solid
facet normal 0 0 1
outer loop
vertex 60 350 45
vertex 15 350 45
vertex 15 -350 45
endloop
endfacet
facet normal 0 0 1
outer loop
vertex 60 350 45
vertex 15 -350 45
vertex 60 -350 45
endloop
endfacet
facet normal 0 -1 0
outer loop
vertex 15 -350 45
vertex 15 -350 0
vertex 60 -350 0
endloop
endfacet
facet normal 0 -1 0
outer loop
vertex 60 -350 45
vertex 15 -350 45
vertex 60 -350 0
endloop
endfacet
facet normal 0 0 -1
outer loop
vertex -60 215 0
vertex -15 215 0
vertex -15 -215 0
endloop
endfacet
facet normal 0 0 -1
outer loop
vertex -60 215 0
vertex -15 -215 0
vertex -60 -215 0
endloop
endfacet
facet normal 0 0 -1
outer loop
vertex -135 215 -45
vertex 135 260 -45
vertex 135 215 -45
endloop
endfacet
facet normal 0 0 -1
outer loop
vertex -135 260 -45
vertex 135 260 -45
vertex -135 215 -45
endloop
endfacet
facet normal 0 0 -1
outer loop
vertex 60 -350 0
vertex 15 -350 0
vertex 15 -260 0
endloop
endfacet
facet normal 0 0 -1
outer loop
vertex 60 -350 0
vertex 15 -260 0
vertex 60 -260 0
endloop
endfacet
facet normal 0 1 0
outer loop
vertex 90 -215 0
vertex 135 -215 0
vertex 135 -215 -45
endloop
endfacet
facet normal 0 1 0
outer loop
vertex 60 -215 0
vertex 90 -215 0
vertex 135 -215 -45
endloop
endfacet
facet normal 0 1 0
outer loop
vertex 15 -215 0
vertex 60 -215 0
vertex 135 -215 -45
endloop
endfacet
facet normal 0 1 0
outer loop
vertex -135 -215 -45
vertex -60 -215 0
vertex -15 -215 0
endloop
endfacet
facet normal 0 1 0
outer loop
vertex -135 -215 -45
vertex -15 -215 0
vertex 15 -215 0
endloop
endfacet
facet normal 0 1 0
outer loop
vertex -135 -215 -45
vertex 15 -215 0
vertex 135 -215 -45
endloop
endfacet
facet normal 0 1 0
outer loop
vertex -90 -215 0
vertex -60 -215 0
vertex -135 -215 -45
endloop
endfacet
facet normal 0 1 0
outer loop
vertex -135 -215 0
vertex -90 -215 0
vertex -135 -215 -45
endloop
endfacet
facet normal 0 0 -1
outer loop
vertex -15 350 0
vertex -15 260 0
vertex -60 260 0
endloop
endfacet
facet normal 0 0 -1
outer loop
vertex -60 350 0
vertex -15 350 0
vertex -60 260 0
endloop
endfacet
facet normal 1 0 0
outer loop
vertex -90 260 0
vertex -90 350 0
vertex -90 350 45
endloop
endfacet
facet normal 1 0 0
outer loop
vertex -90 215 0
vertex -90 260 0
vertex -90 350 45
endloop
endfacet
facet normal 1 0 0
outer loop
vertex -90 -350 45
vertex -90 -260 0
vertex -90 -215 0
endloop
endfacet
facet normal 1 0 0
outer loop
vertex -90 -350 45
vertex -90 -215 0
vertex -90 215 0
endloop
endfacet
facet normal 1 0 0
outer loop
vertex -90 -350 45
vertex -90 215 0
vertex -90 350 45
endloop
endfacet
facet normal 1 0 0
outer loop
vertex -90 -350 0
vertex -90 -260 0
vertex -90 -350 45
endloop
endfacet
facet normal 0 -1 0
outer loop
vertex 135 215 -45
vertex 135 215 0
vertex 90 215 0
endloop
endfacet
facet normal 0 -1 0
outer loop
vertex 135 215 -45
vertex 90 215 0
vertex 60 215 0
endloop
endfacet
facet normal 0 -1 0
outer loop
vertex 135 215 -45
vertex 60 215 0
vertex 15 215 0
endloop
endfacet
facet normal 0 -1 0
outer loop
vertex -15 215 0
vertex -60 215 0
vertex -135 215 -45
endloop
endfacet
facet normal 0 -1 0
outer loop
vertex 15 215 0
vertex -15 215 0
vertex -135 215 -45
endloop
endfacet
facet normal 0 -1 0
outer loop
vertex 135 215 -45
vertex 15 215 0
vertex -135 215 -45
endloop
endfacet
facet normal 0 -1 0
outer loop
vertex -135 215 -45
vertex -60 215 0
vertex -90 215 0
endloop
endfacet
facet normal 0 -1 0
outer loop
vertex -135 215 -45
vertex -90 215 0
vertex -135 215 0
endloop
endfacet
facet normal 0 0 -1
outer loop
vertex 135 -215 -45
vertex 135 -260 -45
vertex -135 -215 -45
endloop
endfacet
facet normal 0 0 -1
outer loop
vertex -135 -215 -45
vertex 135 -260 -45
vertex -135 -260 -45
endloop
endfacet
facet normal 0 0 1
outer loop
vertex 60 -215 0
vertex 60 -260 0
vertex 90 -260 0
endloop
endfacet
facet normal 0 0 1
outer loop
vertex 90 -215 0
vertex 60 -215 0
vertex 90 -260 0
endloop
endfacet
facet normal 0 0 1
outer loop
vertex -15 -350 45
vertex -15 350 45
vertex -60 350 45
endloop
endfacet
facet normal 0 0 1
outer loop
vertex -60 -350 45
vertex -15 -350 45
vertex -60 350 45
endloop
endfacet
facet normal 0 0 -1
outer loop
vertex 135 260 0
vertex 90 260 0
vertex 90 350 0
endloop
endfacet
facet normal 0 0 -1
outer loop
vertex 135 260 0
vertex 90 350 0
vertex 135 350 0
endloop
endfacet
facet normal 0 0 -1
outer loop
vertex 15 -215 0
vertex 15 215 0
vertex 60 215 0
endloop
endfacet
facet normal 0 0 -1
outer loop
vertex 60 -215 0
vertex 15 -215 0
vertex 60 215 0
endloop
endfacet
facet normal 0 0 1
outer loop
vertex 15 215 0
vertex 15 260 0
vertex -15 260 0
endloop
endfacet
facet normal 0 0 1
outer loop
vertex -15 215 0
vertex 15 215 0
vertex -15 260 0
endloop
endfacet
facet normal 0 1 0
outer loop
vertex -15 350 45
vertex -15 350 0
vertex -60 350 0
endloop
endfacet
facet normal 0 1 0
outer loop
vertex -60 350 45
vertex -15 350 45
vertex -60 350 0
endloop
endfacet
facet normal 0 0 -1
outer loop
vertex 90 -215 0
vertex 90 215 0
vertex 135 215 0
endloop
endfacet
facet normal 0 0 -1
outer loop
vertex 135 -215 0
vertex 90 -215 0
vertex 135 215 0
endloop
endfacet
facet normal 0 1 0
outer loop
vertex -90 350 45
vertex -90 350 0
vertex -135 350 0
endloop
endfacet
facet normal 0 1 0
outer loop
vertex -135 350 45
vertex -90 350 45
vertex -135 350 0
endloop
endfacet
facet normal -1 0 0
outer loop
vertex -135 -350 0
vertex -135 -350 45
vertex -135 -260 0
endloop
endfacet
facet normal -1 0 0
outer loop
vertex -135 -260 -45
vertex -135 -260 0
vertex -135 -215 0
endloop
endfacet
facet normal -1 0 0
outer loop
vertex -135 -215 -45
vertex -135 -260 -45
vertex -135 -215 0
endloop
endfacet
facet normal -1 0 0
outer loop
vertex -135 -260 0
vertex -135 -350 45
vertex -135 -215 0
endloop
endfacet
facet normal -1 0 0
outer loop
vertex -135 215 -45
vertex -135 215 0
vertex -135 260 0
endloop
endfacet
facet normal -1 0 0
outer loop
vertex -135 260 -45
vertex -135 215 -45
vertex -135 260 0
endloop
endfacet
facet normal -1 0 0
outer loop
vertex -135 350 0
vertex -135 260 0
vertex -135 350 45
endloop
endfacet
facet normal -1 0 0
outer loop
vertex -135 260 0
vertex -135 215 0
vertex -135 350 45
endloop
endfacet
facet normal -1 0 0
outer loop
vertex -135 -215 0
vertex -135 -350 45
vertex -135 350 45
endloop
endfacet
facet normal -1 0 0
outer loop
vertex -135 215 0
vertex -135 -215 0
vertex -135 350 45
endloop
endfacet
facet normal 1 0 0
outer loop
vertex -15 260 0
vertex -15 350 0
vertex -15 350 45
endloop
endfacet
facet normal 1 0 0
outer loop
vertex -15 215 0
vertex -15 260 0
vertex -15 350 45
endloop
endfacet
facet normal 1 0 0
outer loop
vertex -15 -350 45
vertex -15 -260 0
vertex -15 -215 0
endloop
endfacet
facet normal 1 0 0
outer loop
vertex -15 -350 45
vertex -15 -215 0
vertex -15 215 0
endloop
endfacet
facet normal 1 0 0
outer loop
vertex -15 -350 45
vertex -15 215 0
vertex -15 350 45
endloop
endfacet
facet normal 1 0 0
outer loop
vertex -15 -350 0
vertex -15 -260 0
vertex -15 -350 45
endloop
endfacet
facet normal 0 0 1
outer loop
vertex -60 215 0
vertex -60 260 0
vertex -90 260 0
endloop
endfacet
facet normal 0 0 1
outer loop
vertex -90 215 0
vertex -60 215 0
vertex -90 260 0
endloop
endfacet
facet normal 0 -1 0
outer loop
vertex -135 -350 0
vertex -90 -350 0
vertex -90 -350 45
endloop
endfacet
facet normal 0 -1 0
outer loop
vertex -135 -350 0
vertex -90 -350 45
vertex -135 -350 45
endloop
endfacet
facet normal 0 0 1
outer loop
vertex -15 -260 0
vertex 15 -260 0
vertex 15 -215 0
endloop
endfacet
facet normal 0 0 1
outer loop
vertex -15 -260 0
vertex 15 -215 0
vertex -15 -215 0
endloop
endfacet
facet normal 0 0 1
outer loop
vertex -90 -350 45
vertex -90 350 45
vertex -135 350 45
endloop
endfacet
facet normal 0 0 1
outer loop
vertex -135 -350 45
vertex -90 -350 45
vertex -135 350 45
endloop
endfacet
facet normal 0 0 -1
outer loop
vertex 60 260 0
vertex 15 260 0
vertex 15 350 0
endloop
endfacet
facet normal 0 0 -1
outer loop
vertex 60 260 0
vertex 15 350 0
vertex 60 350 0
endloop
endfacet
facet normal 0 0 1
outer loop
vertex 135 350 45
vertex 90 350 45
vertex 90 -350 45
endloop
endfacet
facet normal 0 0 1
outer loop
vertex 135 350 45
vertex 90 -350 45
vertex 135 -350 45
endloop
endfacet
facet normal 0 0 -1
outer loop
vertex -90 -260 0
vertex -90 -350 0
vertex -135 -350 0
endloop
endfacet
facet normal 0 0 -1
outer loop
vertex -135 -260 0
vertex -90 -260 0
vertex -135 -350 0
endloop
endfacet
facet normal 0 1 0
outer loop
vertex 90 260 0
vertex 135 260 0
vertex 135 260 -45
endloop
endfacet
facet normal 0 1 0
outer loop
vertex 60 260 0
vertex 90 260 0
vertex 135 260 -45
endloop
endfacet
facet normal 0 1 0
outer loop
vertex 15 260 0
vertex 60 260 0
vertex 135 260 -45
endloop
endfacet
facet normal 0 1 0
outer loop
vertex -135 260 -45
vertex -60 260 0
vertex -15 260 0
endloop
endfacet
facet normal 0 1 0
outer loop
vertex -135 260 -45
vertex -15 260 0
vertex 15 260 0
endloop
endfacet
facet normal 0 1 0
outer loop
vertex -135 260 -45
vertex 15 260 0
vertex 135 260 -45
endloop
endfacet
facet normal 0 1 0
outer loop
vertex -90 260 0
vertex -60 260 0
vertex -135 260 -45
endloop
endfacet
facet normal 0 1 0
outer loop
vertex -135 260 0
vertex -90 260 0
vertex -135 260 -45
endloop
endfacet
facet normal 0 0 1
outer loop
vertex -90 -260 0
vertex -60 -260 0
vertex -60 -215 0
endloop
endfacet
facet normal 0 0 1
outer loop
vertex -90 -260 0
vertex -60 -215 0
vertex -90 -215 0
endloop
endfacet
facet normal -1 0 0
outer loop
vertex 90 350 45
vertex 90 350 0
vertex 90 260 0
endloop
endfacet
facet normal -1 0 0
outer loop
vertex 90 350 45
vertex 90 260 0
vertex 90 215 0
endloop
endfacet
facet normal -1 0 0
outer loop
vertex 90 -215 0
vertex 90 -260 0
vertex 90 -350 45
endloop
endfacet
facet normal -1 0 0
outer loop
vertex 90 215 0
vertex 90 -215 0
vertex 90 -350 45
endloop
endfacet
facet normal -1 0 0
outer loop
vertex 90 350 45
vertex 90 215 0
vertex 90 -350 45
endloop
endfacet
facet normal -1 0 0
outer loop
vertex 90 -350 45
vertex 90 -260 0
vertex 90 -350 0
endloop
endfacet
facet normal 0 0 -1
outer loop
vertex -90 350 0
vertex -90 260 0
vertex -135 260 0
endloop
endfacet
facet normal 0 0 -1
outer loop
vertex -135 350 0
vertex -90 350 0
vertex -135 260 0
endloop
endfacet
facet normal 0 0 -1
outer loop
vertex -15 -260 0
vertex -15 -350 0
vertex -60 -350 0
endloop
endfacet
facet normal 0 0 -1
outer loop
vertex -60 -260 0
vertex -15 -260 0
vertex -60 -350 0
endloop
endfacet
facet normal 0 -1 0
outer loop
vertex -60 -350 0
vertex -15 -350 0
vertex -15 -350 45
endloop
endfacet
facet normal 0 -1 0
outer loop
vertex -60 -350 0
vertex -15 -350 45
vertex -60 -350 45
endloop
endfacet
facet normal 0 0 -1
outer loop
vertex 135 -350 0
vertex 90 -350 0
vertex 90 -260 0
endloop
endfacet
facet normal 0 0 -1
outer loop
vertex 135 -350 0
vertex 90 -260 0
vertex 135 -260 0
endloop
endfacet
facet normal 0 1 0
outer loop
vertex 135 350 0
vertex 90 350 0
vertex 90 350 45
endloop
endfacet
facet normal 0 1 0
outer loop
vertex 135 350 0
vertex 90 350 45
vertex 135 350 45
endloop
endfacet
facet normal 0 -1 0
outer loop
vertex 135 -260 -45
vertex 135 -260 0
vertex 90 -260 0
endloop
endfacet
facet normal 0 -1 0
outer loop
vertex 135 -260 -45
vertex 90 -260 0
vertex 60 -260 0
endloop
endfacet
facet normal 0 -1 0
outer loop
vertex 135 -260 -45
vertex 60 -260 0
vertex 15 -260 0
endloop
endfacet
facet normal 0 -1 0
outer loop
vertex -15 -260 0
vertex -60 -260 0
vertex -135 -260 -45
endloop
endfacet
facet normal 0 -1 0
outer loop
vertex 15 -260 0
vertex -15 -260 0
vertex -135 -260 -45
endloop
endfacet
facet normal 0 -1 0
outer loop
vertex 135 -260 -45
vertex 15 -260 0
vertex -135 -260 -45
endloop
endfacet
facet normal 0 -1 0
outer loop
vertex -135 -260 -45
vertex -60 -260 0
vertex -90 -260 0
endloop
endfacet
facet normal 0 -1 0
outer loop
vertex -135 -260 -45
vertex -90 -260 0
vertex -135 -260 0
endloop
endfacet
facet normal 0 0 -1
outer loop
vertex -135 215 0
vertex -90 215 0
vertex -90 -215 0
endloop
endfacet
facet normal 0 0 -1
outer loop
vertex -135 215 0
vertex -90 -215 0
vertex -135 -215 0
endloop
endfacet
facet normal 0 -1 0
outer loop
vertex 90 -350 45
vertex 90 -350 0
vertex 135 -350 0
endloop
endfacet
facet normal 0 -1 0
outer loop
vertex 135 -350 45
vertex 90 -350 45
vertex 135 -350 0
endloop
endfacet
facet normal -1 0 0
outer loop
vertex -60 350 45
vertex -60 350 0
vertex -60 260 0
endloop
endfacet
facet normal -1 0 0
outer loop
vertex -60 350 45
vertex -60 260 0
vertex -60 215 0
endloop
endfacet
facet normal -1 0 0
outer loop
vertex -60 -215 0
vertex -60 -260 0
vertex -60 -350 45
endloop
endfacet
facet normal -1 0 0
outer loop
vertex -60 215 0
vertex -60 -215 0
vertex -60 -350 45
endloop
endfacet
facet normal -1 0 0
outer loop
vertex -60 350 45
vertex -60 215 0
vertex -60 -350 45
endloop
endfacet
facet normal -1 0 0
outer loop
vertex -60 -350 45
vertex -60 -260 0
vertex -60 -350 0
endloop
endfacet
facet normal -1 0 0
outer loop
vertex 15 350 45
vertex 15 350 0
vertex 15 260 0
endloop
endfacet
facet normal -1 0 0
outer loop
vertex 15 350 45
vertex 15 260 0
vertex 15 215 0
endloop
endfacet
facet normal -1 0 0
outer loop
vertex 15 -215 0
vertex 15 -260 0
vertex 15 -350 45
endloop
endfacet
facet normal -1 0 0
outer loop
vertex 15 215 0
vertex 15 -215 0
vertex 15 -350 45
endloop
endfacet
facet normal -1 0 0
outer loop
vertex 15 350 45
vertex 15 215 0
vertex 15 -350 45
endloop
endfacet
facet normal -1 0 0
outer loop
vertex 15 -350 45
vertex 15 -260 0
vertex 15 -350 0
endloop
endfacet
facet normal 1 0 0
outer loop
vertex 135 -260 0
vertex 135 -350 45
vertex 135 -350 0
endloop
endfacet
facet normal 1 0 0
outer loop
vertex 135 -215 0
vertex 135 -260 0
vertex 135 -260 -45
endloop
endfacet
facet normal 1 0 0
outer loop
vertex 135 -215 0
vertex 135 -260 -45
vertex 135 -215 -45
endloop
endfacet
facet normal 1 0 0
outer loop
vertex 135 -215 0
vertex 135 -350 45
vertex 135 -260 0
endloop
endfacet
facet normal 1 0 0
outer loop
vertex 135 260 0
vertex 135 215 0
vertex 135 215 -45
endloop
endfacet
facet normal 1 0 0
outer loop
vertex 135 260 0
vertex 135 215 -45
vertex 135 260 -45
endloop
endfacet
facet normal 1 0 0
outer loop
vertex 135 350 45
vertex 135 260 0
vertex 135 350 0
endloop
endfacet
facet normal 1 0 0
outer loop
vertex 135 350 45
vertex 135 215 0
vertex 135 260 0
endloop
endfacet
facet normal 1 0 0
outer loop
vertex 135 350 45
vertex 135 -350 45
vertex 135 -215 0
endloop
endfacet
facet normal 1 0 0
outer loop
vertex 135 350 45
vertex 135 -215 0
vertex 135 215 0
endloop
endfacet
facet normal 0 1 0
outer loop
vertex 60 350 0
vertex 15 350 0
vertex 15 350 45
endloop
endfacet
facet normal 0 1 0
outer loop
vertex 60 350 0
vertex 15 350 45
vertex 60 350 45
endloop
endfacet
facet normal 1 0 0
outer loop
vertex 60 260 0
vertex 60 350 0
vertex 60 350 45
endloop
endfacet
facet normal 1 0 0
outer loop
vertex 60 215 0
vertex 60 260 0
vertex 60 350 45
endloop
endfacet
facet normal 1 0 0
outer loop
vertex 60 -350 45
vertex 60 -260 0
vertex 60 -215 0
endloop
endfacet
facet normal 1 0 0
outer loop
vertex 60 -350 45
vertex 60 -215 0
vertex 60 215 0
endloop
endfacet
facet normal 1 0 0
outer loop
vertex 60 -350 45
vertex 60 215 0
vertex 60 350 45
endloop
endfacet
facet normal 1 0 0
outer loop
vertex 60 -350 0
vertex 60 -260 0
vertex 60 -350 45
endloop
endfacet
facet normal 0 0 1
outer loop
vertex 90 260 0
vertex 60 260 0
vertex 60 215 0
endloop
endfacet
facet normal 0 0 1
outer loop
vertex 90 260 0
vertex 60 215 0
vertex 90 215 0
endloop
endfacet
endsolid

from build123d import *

# Parameters (mm, degrees)
F0_W     = 45
F0_H     = 350
F2_DEPTH = 45
F1_W     = 135
F1_H     = 45
F3_DEPTH = 45


with BuildPart() as f2:
    # F0 (on Top) → F2 (new body)
    with BuildSketch(Plane.XY):
        with Locations((112.5, 175)):
            Rectangle(F0_W, F0_H)
    extrude(amount=F2_DEPTH)



with BuildPart() as f2b:
    # F0 (on Top) → F2, piece 2 (new body)
    with BuildSketch(Plane.XY):
        with Locations((37.5, 175)):
            Rectangle(F0_W, F0_H)
    extrude(amount=F2_DEPTH)


with BuildPart() as f3:
    # F1 (on Top) → F3 (new body)
    with BuildSketch(Plane.XY):
        with Locations((67.5, 237.5)):
            Rectangle(F1_W, F1_H)
    extrude(amount=-F3_DEPTH)


with BuildPart() as f2_1:
    add(f2.part)

    add(f2b.part)  # F4 merges F2b
    # F4: F3, F2b, F2 across plane
    add(f3.part.mirror(Plane.XZ))
    add(f2b.part.mirror(Plane.XZ))
    add(f2.part.mirror(Plane.XZ))



with BuildPart() as f2_2:
    add(f2_1.part)

    add(f3.part)  # F5 merges F3
    # F5: F2, F3 across plane
    add(f2_1.part.mirror(Plane.YZ))
    add(f3.part.mirror(Plane.YZ))


solid = f2_2.part
